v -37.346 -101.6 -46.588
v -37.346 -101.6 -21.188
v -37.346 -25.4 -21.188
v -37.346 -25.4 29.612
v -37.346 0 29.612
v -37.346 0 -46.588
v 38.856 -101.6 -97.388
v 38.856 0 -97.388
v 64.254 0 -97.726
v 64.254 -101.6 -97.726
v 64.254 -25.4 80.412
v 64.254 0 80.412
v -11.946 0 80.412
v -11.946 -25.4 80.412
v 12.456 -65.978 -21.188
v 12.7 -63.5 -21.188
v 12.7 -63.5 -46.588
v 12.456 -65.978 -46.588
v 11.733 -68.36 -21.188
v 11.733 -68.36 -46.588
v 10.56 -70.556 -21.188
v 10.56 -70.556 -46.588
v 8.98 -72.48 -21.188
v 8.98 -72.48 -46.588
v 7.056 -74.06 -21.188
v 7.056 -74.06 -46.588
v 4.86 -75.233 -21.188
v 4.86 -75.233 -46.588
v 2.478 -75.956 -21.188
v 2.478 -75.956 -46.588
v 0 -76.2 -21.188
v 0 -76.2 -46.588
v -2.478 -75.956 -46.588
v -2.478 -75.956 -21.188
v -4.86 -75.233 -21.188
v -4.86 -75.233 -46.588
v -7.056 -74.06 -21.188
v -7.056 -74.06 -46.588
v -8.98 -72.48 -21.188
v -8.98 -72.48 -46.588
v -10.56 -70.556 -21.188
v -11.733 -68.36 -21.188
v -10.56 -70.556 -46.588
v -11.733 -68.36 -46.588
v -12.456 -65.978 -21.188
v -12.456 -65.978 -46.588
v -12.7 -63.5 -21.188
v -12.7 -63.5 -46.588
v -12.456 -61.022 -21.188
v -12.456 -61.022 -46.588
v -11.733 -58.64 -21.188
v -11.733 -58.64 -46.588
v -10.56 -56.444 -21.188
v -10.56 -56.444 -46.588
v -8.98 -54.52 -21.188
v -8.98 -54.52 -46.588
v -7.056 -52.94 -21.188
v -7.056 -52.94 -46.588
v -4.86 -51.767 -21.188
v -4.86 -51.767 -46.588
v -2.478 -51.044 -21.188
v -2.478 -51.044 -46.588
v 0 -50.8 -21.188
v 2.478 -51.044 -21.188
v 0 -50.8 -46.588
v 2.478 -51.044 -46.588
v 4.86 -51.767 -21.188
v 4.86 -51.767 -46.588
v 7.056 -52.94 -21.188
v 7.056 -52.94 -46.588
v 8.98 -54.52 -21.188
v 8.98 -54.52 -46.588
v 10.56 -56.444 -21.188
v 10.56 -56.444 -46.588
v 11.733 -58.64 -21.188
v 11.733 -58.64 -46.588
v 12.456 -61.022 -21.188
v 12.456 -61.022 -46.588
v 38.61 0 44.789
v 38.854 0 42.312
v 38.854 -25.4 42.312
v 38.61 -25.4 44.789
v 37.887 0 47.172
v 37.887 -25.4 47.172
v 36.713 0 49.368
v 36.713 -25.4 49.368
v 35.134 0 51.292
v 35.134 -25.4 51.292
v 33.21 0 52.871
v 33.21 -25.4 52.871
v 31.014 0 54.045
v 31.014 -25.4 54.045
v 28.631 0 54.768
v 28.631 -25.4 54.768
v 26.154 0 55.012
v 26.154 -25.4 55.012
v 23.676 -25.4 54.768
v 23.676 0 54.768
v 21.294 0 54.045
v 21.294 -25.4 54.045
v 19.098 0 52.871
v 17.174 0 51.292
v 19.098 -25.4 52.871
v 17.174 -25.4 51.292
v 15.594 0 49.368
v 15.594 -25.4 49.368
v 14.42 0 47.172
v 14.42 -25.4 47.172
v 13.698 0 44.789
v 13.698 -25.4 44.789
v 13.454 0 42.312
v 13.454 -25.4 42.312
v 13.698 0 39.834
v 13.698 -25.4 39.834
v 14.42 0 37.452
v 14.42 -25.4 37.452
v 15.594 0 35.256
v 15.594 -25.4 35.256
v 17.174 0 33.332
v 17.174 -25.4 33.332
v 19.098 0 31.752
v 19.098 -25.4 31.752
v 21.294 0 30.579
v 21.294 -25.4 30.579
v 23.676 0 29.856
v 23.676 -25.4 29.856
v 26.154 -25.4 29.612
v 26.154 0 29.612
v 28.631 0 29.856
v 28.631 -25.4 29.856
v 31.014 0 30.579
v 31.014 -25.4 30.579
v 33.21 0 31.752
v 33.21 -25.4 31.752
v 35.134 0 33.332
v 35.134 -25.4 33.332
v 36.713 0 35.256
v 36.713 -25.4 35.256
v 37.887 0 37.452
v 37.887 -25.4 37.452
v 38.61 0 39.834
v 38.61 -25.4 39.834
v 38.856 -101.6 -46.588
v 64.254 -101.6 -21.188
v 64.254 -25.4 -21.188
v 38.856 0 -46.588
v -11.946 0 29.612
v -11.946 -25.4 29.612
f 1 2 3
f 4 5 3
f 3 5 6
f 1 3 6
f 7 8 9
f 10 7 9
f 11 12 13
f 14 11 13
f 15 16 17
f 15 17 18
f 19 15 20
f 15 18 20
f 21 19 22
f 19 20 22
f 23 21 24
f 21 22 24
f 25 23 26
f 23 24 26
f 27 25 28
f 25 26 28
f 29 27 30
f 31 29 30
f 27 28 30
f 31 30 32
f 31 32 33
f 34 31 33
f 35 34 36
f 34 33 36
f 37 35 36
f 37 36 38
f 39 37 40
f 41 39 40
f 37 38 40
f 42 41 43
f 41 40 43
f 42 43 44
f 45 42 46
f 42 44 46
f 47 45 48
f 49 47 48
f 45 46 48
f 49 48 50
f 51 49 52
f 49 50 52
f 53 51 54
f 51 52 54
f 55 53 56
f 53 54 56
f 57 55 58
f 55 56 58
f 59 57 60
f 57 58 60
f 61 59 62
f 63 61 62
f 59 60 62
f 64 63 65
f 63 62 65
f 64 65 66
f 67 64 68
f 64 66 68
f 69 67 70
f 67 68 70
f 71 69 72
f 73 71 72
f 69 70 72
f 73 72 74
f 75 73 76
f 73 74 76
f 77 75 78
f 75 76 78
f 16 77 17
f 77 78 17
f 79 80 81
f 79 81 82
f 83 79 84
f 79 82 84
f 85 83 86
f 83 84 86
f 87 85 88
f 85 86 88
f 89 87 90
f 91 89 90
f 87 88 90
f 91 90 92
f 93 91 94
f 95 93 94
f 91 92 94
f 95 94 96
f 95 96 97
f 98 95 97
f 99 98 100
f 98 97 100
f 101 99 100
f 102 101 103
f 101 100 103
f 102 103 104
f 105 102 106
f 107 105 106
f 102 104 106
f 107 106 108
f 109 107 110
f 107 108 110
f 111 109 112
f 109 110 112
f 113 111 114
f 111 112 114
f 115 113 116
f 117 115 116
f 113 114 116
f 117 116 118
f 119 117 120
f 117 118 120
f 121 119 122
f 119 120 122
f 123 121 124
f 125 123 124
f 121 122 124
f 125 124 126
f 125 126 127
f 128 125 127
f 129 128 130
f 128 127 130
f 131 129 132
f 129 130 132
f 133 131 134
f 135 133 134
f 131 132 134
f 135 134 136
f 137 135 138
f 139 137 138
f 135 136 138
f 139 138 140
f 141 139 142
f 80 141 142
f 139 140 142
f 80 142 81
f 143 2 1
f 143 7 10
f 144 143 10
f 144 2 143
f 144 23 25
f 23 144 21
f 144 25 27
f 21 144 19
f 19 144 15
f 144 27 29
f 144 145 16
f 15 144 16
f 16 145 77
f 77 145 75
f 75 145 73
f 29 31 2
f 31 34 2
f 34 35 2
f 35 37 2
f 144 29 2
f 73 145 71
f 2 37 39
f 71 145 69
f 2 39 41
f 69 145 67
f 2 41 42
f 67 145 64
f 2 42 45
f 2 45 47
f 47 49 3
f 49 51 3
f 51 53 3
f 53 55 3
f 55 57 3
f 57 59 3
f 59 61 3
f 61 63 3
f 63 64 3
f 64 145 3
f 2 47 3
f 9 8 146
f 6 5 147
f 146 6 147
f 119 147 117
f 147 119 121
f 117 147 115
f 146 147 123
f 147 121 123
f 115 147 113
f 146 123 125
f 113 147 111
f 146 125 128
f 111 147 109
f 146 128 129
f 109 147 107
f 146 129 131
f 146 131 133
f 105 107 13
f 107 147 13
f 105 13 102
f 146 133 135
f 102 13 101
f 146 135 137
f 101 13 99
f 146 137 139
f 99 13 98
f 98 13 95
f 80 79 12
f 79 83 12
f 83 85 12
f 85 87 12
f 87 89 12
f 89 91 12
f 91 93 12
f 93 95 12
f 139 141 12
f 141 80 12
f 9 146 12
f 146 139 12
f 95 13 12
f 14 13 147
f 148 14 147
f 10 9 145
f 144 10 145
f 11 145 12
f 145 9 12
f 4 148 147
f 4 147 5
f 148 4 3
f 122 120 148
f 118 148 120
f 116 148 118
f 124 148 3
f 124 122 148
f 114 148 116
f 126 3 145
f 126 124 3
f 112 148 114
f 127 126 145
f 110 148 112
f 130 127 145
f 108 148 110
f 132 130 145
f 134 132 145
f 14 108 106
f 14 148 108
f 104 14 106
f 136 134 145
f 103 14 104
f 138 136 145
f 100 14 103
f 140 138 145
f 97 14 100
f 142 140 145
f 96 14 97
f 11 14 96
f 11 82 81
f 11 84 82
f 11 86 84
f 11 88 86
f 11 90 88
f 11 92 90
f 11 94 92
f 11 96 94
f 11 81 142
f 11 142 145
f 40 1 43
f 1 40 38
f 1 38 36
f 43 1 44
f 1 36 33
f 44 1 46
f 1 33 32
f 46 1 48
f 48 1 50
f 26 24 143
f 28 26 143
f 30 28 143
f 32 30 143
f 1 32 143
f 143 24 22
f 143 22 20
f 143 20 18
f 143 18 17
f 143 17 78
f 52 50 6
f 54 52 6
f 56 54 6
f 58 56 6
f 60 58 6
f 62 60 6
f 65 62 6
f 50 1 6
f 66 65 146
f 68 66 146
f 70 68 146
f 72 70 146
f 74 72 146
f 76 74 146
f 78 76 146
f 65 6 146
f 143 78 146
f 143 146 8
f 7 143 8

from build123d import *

# Parameters (mm, degrees)
F1_DEPTH = 25.4
F2_DEPTH = 101.6
F3_R     = 12.7
F4_DEPTH = 25.4
F5_R     = 12.7
F6_DEPTH = 25.4


with BuildPart() as f1:
    # F0 (on Front) → F1 (new body)
    with BuildSketch(Plane.XZ):
        Polygon((64.253767, 80.411777), (-11.946233, 80.411777), (-11.946233, 29.611777), (-37.346233, 29.611777), (-37.346233, -21.188223), (64.253767, -21.188223), align=None)
    extrude(amount=F1_DEPTH)

    # F0 (on Front) → F2 (join)
    with BuildSketch(Plane.XZ):
        Polygon((64.253767, -97.725551), (64.253767, -21.188223), (-37.346233, -21.188223), (-37.346233, -46.588223), (38.856007, -46.588223), (38.856007, -97.388223), align=None)
    extrude(amount=F2_DEPTH)

    # F3 (on face) → F4 (cut)
    with BuildSketch(Plane.XZ.offset(25.4)):
        with Locations((26.153767, 42.311777)):
            Circle(F3_R)
    extrude(amount=-F4_DEPTH, mode=Mode.SUBTRACT)

    # F5 (on face) → F6 (cut)
    with BuildSketch(Plane(origin=(0, 0, -46.588223), x_dir=(1, 0, 0), z_dir=(0, 0, -1))):
        with Locations((0, 63.5)):
            Circle(F5_R)
    extrude(amount=-F6_DEPTH, mode=Mode.SUBTRACT)


solid = f1.part
